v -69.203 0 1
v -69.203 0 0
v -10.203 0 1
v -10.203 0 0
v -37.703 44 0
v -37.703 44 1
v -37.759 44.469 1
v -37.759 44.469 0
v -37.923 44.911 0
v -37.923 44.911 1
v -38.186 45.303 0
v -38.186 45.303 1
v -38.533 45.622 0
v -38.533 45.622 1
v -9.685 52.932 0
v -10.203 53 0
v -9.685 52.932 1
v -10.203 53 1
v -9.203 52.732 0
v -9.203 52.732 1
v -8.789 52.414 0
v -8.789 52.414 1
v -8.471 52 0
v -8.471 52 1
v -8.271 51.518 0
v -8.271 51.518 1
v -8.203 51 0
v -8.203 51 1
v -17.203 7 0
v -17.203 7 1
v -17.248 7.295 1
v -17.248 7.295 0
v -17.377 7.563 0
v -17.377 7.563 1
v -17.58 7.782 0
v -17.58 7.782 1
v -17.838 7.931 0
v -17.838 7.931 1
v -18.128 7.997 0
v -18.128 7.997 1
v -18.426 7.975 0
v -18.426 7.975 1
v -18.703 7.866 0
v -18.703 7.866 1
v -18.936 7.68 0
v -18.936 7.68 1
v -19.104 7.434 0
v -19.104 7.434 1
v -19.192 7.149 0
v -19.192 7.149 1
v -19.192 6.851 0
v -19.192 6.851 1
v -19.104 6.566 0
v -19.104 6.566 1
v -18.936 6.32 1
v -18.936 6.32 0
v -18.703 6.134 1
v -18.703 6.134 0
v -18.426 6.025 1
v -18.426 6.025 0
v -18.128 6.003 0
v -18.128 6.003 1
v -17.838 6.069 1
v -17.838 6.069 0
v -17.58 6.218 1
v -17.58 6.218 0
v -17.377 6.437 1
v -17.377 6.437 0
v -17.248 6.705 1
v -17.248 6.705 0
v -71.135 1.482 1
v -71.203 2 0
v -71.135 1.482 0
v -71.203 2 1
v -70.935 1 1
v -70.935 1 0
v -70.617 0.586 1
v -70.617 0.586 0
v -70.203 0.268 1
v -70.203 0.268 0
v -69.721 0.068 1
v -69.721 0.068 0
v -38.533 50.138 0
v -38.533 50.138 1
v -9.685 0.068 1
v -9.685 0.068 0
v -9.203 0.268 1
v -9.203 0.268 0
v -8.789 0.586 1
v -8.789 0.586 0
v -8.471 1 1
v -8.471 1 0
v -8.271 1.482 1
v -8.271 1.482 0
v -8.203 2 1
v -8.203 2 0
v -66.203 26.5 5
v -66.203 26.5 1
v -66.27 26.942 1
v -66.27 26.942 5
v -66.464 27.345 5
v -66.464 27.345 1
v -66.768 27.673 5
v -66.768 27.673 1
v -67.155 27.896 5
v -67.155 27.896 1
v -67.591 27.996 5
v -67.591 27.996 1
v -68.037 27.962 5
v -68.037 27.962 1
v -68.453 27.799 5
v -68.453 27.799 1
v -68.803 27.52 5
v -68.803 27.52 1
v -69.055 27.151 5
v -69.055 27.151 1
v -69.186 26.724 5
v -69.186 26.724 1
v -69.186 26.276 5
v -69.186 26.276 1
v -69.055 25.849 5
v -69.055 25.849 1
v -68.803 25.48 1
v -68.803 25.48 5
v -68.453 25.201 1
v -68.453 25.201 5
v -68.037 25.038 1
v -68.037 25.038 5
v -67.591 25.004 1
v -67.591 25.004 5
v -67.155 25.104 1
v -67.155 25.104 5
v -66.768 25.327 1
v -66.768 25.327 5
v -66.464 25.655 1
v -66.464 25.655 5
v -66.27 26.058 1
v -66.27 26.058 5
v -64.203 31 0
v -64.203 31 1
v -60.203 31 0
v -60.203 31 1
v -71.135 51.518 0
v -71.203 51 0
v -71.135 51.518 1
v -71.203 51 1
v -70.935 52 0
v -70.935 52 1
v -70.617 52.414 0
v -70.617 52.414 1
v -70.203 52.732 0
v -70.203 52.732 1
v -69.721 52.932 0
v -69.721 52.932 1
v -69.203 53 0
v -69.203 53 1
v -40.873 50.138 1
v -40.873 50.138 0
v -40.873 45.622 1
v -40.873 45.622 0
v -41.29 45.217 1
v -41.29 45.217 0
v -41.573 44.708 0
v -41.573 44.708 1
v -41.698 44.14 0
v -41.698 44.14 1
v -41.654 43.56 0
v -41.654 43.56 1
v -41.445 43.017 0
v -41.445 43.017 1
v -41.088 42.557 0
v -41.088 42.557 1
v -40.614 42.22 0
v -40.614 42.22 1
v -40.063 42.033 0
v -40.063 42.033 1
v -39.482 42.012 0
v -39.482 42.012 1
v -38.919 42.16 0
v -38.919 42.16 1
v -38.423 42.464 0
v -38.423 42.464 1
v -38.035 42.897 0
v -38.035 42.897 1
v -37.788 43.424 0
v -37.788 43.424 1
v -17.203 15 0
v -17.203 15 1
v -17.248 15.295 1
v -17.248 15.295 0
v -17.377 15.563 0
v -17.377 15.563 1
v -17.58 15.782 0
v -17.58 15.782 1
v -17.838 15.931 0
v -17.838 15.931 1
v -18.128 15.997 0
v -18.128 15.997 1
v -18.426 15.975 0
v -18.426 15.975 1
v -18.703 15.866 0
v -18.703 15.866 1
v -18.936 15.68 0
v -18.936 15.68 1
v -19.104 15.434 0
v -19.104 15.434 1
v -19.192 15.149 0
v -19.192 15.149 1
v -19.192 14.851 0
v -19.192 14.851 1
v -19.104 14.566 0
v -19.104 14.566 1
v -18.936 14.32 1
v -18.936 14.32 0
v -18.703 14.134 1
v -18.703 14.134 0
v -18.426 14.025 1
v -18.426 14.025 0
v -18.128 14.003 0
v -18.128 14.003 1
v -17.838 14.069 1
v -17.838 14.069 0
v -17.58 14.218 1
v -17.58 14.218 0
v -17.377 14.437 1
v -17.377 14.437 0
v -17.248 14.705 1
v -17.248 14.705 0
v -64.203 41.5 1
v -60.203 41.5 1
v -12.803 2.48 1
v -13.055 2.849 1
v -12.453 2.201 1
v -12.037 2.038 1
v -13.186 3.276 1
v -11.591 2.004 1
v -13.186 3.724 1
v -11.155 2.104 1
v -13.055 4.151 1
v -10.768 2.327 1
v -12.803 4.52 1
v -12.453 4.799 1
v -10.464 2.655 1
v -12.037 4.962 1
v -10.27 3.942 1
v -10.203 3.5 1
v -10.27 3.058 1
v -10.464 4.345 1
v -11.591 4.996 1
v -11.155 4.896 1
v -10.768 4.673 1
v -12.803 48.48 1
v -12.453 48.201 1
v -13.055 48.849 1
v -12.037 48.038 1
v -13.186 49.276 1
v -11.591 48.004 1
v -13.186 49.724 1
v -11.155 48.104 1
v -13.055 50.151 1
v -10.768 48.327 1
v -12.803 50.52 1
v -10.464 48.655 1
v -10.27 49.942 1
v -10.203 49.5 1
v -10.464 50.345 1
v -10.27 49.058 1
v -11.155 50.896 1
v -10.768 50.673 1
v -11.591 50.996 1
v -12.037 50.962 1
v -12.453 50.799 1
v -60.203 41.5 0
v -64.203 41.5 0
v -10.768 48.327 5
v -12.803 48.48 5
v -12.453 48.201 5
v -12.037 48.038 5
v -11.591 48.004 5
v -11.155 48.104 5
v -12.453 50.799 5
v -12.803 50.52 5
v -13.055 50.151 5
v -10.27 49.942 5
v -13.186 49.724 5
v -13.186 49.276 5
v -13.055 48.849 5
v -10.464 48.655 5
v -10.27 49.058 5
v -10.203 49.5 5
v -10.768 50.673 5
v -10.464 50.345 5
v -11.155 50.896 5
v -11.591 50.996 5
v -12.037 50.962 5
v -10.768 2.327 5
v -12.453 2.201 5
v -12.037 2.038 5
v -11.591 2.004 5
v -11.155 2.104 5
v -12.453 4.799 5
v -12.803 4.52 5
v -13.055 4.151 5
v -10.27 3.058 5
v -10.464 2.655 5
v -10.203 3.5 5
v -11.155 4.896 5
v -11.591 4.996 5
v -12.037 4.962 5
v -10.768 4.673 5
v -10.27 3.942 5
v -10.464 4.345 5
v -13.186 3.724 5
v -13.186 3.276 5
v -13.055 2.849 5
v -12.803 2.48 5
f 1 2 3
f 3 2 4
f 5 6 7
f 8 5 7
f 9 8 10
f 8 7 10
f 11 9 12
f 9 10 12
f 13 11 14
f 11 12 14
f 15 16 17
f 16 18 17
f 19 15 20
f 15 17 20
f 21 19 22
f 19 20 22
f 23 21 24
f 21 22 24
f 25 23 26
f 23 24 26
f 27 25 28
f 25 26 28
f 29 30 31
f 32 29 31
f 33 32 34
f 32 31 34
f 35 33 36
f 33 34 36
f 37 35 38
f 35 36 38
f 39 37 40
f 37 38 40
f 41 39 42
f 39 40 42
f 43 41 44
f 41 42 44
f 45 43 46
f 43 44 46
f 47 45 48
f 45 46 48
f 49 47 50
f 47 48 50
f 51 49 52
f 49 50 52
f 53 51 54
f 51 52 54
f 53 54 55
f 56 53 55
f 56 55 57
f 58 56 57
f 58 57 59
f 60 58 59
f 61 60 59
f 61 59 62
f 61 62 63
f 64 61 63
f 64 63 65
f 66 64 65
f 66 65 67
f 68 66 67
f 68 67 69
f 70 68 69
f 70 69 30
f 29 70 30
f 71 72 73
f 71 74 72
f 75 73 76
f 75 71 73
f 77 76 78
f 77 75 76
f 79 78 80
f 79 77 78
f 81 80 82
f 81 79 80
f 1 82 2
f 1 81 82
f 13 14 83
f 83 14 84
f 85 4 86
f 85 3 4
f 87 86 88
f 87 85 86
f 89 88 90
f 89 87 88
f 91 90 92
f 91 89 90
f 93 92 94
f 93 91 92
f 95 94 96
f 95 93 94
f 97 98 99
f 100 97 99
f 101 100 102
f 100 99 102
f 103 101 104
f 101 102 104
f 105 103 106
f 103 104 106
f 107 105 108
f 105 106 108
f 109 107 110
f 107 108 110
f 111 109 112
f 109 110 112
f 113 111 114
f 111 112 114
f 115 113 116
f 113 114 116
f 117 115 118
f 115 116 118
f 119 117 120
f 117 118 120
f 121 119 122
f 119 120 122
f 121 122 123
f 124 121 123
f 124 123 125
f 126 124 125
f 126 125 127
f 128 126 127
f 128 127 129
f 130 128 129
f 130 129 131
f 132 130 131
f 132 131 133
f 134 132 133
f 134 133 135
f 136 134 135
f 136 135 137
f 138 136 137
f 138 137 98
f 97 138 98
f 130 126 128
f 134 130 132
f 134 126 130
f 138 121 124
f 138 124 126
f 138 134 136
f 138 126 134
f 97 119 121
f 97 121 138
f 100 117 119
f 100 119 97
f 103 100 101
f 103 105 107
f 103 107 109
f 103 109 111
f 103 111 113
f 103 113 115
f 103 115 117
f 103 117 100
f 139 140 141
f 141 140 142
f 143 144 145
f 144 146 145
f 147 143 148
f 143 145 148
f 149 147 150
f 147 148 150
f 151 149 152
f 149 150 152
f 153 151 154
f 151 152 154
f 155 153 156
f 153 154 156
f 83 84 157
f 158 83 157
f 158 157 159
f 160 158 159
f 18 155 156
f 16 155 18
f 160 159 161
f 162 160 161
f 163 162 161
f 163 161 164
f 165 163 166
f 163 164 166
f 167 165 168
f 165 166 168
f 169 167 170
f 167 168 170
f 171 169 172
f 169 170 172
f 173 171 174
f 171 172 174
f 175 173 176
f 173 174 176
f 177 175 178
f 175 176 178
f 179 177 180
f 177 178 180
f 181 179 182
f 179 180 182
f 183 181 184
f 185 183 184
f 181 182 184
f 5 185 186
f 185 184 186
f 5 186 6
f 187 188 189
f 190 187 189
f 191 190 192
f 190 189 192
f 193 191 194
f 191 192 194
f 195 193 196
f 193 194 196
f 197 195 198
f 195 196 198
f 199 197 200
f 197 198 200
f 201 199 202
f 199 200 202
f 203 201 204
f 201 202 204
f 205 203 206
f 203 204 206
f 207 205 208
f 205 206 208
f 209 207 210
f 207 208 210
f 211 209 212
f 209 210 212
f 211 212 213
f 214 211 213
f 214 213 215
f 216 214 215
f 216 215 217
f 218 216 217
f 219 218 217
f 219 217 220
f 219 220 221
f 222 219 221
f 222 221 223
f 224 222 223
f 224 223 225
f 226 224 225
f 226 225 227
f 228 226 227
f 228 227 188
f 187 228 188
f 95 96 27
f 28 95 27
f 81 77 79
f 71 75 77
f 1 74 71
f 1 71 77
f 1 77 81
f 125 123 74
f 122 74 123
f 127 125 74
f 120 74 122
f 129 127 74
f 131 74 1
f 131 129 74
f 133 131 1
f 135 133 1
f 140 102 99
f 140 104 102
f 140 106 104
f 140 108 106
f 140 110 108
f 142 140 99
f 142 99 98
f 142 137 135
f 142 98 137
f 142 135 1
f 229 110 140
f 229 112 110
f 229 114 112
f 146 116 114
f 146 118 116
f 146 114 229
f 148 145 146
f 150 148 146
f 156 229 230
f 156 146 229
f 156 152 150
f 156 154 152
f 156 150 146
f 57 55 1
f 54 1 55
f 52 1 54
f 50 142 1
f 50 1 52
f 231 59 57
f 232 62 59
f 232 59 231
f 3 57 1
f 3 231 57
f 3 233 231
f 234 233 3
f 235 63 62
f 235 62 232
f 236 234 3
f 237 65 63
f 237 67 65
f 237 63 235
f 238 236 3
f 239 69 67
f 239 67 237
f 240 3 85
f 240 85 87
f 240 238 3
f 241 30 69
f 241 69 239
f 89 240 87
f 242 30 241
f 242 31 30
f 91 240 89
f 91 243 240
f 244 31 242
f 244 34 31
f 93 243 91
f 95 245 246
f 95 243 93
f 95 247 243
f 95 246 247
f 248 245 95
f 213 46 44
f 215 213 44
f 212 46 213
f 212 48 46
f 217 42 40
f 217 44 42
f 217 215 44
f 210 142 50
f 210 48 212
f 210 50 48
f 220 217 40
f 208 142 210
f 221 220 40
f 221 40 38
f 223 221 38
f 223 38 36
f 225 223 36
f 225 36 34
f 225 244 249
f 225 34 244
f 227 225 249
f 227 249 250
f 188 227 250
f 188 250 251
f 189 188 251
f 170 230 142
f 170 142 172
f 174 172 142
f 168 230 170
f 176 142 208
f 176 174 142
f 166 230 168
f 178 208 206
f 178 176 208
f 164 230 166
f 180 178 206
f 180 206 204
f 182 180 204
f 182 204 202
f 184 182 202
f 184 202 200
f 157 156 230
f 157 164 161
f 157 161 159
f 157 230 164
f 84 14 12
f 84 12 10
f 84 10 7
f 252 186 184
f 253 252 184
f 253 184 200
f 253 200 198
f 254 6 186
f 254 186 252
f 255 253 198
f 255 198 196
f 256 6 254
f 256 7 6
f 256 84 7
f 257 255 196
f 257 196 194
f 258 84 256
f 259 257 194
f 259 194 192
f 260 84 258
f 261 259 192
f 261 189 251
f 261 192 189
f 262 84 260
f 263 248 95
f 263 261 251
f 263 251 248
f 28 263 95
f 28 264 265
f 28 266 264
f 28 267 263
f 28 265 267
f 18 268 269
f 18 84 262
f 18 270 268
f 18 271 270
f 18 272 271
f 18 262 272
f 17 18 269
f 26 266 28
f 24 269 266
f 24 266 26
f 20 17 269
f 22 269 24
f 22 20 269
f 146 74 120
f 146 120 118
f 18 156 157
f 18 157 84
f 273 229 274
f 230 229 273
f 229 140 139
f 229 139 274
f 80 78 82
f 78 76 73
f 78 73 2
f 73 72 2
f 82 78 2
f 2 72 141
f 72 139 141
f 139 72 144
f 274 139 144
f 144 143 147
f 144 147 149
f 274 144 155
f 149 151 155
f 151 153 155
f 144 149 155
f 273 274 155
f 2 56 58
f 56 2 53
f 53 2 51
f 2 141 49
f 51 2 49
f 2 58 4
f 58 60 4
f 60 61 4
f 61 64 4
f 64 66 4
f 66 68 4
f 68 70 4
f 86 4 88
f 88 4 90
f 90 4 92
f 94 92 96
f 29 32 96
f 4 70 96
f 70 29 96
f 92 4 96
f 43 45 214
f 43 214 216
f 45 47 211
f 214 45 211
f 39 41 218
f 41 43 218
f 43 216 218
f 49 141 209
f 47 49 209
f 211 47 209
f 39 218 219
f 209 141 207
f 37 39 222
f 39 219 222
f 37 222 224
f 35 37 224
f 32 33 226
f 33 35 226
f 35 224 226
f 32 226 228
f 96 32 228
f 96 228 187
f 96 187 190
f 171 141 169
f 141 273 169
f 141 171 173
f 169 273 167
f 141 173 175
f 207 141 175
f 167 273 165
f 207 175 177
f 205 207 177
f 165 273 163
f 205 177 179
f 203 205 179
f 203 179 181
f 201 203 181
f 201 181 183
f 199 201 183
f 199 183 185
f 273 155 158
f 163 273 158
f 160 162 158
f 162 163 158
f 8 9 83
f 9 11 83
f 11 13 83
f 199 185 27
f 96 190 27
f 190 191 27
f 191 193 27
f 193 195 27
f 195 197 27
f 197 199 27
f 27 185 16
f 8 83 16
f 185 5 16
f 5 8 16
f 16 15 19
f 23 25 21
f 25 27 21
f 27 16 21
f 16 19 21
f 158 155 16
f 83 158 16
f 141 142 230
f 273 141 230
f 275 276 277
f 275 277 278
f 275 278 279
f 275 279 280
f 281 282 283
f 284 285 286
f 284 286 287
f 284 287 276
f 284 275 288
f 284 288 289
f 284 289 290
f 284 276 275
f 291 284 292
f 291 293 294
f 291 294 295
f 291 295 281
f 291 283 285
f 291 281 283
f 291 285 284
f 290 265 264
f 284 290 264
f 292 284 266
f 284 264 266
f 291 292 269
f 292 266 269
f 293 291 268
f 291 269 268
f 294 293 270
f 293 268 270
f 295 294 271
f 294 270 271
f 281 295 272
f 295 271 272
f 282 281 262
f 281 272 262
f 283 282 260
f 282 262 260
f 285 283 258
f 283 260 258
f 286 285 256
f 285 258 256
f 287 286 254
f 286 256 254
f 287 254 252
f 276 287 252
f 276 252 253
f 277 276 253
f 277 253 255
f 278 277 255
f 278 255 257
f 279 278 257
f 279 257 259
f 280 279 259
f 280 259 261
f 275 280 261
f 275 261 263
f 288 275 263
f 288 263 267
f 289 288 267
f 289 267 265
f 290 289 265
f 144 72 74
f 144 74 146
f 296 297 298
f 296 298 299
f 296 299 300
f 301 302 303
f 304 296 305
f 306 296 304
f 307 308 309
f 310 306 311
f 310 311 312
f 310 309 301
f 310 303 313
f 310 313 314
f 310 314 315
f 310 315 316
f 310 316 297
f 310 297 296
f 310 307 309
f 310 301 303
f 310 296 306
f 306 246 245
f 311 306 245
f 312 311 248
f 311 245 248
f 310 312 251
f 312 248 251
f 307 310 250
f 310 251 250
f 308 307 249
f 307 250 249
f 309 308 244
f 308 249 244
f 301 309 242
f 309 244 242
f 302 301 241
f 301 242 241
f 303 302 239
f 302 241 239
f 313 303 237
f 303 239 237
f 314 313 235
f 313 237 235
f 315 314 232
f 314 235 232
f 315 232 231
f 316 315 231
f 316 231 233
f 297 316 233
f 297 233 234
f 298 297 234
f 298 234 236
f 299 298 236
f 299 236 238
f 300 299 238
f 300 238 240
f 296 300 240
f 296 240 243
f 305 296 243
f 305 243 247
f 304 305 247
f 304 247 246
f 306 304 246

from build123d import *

# Parameters (mm, degrees)
F1_W     = 63
F1_H     = 53
F1_R     = 1.5
F1_R_2   = 1
F1_W_2   = 4
F1_H_2   = 10.5
F2_DEPTH = 1
F3_R     = 2
F4_DEPTH = 25
F5_DEPTH = 25
F6_DEPTH = 25
F7_DEPTH = 20


with BuildPart() as f2:
    # F1 (on face) → F2 (new body)
    with BuildSketch(Plane.XY):
        with Locations((-39.7031286434, 26.5)):
            Rectangle(F1_W, F1_H)
        with Locations((-11.7031286434, 3.5)):
            Circle(F1_R, mode=Mode.SUBTRACT)
        with Locations((-18.2031286434, 7)):
            Circle(F1_R_2, mode=Mode.SUBTRACT)
        with Locations((-18.2031286434, 15)):
            Circle(F1_R_2, mode=Mode.SUBTRACT)
        with Locations((-67.7031286434, 26.5)):
            Circle(F1_R, mode=Mode.SUBTRACT)
        with Locations((-62.2031286434, 36.25)):
            Rectangle(F1_W_2, F1_H_2, mode=Mode.SUBTRACT)
        with BuildLine():
            ThreePointArc((-38.5332978681, 45.6221886318), (-37.9227267856, 44.9111362273), (-37.7031286434, 44))
            ThreePointArc((-37.7031286434, 44), (-40.6142648707, 42.2195981422), (-40.8729594187, 45.6221886318))
            Line((-40.8729594187, 45.6221886318), (-40.8729594187, 50.1384101469))
            Line((-40.8729594187, 50.1384101469), (-38.5332978681, 50.1384101469))
            Line((-38.5332978681, 50.1384101469), (-38.5332978681, 45.6221886318))
        make_face(mode=Mode.SUBTRACT)
        with Locations((-11.7031286434, 49.5)):
            Circle(F1_R, mode=Mode.SUBTRACT)
    extrude(amount=F2_DEPTH)

    # F3
    f3_edges = [f2.edges().sort_by_distance(p)[0] for p in [
        (-71.203129, 53, 0.5),
        (-71.203129, 0, 0.5),
        (-8.203129, 0, 0.5),
        (-8.203129, 53, 0.5),
    ]]
    fillet(f3_edges, radius=F3_R)

    # F1 (on face) → F4 (join)
    with BuildSketch(Plane.XY):
        with Locations((-11.7031286434, 49.5)):
            Circle(F1_R)
        with Locations((-11.7031286434, 3.5)):
            Circle(F1_R)
        with Locations((-67.7031286434, 26.5)):
            Circle(F1_R)
        with Locations((-62.2031286434, 36.25)):
            Rectangle(F1_W_2, F1_H_2)
        with Locations((-18.2031286434, 7)):
            Circle(F1_R_2)
        with Locations((-18.2031286434, 15)):
            Circle(F1_R_2)
        with BuildLine():
            ThreePointArc((-40.8729594187, 45.6221886318), (-40.6142648707, 42.2195981422), (-37.7031286434, 44))
            ThreePointArc((-37.7031286434, 44), (-37.9227267856, 44.9111362273), (-38.5332978681, 45.6221886318))
            Line((-38.5332978681, 45.6221886318), (-40.8729594187, 45.6221886318))
        make_face()
        with BuildLine():
            Line((-40.8729594187, 45.6221886318), (-38.5332978681, 45.6221886318))
            ThreePointArc((-38.5332978681, 45.6221886318), (-39.7031286434, 46), (-40.8729594187, 45.6221886318))
        make_face()
        with BuildLine():
            ThreePointArc((-40.8729594187, 45.6221886318), (-39.7031286434, 46), (-38.5332978681, 45.6221886318))
            Line((-38.5332978681, 45.6221886318), (-38.5332978681, 50.1384101469))
            Line((-38.5332978681, 50.1384101469), (-40.8729594187, 50.1384101469))
            Line((-40.8729594187, 50.1384101469), (-40.8729594187, 45.6221886318))
        make_face()
    extrude(amount=F4_DEPTH)

    # F5 (cut): a face of the model
    f5_faces = [f2.faces().sort_by_distance(p)[0] for p in [
        (-62.2031286434, 36.25, 25),
    ]]
    extrude(f5_faces, amount=-F5_DEPTH, mode=Mode.SUBTRACT)

    # F6 (cut): faces of the model
    f6_faces = [f2.faces().sort_by_distance(p)[0] for p in [
        (-39.7031286434, 45.772355973, 25),
        (-18.2031286434, 15, 25),
        (-18.2031286434, 7, 25),
    ]]
    extrude(f6_faces, amount=-F6_DEPTH, mode=Mode.SUBTRACT)

    # F7 (cut): faces of the model
    f7_faces = [f2.faces().sort_by_distance(p)[0] for p in [
        (-11.7031286434, 49.5, 25),
        (-67.7031286434, 26.5, 25),
        (-11.7031286434, 3.5, 25),
    ]]
    extrude(f7_faces, amount=-F7_DEPTH, mode=Mode.SUBTRACT)


solid = f2.part
